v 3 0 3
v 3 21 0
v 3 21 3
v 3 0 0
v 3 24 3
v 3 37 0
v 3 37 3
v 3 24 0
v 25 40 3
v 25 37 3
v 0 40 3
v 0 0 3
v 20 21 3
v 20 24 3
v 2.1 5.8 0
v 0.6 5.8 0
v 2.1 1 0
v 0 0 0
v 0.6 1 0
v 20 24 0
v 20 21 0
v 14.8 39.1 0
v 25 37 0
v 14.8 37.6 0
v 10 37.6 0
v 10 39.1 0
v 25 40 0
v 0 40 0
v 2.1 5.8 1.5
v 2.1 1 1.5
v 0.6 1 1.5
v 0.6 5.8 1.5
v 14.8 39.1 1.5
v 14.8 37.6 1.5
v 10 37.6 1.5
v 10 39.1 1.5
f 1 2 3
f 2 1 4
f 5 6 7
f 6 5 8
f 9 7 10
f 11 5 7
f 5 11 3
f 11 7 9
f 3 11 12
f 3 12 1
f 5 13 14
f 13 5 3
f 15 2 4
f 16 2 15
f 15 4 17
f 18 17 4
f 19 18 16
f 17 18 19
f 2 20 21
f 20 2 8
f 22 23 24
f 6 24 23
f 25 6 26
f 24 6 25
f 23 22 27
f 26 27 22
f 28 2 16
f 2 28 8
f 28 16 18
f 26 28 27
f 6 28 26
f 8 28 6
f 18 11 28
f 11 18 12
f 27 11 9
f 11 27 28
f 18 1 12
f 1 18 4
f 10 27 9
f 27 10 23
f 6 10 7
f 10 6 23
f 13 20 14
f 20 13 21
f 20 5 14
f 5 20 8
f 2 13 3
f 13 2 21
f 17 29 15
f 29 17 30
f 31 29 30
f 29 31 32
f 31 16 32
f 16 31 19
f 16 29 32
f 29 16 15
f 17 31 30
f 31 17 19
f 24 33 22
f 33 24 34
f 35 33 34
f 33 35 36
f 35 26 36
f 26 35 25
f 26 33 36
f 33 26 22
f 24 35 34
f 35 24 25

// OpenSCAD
difference(){
 union(){
  cube([3,40,3]);
  translate([0,37,0]) cube([25,3,3]);
  translate([0,21,0]) cube([20,3,3]);
}
 translate([0.6,1,0]) cube([1.5,4.8,1.5]);
 translate([10,37.6,0]) cube([4.8,1.5,1.5]);

}
